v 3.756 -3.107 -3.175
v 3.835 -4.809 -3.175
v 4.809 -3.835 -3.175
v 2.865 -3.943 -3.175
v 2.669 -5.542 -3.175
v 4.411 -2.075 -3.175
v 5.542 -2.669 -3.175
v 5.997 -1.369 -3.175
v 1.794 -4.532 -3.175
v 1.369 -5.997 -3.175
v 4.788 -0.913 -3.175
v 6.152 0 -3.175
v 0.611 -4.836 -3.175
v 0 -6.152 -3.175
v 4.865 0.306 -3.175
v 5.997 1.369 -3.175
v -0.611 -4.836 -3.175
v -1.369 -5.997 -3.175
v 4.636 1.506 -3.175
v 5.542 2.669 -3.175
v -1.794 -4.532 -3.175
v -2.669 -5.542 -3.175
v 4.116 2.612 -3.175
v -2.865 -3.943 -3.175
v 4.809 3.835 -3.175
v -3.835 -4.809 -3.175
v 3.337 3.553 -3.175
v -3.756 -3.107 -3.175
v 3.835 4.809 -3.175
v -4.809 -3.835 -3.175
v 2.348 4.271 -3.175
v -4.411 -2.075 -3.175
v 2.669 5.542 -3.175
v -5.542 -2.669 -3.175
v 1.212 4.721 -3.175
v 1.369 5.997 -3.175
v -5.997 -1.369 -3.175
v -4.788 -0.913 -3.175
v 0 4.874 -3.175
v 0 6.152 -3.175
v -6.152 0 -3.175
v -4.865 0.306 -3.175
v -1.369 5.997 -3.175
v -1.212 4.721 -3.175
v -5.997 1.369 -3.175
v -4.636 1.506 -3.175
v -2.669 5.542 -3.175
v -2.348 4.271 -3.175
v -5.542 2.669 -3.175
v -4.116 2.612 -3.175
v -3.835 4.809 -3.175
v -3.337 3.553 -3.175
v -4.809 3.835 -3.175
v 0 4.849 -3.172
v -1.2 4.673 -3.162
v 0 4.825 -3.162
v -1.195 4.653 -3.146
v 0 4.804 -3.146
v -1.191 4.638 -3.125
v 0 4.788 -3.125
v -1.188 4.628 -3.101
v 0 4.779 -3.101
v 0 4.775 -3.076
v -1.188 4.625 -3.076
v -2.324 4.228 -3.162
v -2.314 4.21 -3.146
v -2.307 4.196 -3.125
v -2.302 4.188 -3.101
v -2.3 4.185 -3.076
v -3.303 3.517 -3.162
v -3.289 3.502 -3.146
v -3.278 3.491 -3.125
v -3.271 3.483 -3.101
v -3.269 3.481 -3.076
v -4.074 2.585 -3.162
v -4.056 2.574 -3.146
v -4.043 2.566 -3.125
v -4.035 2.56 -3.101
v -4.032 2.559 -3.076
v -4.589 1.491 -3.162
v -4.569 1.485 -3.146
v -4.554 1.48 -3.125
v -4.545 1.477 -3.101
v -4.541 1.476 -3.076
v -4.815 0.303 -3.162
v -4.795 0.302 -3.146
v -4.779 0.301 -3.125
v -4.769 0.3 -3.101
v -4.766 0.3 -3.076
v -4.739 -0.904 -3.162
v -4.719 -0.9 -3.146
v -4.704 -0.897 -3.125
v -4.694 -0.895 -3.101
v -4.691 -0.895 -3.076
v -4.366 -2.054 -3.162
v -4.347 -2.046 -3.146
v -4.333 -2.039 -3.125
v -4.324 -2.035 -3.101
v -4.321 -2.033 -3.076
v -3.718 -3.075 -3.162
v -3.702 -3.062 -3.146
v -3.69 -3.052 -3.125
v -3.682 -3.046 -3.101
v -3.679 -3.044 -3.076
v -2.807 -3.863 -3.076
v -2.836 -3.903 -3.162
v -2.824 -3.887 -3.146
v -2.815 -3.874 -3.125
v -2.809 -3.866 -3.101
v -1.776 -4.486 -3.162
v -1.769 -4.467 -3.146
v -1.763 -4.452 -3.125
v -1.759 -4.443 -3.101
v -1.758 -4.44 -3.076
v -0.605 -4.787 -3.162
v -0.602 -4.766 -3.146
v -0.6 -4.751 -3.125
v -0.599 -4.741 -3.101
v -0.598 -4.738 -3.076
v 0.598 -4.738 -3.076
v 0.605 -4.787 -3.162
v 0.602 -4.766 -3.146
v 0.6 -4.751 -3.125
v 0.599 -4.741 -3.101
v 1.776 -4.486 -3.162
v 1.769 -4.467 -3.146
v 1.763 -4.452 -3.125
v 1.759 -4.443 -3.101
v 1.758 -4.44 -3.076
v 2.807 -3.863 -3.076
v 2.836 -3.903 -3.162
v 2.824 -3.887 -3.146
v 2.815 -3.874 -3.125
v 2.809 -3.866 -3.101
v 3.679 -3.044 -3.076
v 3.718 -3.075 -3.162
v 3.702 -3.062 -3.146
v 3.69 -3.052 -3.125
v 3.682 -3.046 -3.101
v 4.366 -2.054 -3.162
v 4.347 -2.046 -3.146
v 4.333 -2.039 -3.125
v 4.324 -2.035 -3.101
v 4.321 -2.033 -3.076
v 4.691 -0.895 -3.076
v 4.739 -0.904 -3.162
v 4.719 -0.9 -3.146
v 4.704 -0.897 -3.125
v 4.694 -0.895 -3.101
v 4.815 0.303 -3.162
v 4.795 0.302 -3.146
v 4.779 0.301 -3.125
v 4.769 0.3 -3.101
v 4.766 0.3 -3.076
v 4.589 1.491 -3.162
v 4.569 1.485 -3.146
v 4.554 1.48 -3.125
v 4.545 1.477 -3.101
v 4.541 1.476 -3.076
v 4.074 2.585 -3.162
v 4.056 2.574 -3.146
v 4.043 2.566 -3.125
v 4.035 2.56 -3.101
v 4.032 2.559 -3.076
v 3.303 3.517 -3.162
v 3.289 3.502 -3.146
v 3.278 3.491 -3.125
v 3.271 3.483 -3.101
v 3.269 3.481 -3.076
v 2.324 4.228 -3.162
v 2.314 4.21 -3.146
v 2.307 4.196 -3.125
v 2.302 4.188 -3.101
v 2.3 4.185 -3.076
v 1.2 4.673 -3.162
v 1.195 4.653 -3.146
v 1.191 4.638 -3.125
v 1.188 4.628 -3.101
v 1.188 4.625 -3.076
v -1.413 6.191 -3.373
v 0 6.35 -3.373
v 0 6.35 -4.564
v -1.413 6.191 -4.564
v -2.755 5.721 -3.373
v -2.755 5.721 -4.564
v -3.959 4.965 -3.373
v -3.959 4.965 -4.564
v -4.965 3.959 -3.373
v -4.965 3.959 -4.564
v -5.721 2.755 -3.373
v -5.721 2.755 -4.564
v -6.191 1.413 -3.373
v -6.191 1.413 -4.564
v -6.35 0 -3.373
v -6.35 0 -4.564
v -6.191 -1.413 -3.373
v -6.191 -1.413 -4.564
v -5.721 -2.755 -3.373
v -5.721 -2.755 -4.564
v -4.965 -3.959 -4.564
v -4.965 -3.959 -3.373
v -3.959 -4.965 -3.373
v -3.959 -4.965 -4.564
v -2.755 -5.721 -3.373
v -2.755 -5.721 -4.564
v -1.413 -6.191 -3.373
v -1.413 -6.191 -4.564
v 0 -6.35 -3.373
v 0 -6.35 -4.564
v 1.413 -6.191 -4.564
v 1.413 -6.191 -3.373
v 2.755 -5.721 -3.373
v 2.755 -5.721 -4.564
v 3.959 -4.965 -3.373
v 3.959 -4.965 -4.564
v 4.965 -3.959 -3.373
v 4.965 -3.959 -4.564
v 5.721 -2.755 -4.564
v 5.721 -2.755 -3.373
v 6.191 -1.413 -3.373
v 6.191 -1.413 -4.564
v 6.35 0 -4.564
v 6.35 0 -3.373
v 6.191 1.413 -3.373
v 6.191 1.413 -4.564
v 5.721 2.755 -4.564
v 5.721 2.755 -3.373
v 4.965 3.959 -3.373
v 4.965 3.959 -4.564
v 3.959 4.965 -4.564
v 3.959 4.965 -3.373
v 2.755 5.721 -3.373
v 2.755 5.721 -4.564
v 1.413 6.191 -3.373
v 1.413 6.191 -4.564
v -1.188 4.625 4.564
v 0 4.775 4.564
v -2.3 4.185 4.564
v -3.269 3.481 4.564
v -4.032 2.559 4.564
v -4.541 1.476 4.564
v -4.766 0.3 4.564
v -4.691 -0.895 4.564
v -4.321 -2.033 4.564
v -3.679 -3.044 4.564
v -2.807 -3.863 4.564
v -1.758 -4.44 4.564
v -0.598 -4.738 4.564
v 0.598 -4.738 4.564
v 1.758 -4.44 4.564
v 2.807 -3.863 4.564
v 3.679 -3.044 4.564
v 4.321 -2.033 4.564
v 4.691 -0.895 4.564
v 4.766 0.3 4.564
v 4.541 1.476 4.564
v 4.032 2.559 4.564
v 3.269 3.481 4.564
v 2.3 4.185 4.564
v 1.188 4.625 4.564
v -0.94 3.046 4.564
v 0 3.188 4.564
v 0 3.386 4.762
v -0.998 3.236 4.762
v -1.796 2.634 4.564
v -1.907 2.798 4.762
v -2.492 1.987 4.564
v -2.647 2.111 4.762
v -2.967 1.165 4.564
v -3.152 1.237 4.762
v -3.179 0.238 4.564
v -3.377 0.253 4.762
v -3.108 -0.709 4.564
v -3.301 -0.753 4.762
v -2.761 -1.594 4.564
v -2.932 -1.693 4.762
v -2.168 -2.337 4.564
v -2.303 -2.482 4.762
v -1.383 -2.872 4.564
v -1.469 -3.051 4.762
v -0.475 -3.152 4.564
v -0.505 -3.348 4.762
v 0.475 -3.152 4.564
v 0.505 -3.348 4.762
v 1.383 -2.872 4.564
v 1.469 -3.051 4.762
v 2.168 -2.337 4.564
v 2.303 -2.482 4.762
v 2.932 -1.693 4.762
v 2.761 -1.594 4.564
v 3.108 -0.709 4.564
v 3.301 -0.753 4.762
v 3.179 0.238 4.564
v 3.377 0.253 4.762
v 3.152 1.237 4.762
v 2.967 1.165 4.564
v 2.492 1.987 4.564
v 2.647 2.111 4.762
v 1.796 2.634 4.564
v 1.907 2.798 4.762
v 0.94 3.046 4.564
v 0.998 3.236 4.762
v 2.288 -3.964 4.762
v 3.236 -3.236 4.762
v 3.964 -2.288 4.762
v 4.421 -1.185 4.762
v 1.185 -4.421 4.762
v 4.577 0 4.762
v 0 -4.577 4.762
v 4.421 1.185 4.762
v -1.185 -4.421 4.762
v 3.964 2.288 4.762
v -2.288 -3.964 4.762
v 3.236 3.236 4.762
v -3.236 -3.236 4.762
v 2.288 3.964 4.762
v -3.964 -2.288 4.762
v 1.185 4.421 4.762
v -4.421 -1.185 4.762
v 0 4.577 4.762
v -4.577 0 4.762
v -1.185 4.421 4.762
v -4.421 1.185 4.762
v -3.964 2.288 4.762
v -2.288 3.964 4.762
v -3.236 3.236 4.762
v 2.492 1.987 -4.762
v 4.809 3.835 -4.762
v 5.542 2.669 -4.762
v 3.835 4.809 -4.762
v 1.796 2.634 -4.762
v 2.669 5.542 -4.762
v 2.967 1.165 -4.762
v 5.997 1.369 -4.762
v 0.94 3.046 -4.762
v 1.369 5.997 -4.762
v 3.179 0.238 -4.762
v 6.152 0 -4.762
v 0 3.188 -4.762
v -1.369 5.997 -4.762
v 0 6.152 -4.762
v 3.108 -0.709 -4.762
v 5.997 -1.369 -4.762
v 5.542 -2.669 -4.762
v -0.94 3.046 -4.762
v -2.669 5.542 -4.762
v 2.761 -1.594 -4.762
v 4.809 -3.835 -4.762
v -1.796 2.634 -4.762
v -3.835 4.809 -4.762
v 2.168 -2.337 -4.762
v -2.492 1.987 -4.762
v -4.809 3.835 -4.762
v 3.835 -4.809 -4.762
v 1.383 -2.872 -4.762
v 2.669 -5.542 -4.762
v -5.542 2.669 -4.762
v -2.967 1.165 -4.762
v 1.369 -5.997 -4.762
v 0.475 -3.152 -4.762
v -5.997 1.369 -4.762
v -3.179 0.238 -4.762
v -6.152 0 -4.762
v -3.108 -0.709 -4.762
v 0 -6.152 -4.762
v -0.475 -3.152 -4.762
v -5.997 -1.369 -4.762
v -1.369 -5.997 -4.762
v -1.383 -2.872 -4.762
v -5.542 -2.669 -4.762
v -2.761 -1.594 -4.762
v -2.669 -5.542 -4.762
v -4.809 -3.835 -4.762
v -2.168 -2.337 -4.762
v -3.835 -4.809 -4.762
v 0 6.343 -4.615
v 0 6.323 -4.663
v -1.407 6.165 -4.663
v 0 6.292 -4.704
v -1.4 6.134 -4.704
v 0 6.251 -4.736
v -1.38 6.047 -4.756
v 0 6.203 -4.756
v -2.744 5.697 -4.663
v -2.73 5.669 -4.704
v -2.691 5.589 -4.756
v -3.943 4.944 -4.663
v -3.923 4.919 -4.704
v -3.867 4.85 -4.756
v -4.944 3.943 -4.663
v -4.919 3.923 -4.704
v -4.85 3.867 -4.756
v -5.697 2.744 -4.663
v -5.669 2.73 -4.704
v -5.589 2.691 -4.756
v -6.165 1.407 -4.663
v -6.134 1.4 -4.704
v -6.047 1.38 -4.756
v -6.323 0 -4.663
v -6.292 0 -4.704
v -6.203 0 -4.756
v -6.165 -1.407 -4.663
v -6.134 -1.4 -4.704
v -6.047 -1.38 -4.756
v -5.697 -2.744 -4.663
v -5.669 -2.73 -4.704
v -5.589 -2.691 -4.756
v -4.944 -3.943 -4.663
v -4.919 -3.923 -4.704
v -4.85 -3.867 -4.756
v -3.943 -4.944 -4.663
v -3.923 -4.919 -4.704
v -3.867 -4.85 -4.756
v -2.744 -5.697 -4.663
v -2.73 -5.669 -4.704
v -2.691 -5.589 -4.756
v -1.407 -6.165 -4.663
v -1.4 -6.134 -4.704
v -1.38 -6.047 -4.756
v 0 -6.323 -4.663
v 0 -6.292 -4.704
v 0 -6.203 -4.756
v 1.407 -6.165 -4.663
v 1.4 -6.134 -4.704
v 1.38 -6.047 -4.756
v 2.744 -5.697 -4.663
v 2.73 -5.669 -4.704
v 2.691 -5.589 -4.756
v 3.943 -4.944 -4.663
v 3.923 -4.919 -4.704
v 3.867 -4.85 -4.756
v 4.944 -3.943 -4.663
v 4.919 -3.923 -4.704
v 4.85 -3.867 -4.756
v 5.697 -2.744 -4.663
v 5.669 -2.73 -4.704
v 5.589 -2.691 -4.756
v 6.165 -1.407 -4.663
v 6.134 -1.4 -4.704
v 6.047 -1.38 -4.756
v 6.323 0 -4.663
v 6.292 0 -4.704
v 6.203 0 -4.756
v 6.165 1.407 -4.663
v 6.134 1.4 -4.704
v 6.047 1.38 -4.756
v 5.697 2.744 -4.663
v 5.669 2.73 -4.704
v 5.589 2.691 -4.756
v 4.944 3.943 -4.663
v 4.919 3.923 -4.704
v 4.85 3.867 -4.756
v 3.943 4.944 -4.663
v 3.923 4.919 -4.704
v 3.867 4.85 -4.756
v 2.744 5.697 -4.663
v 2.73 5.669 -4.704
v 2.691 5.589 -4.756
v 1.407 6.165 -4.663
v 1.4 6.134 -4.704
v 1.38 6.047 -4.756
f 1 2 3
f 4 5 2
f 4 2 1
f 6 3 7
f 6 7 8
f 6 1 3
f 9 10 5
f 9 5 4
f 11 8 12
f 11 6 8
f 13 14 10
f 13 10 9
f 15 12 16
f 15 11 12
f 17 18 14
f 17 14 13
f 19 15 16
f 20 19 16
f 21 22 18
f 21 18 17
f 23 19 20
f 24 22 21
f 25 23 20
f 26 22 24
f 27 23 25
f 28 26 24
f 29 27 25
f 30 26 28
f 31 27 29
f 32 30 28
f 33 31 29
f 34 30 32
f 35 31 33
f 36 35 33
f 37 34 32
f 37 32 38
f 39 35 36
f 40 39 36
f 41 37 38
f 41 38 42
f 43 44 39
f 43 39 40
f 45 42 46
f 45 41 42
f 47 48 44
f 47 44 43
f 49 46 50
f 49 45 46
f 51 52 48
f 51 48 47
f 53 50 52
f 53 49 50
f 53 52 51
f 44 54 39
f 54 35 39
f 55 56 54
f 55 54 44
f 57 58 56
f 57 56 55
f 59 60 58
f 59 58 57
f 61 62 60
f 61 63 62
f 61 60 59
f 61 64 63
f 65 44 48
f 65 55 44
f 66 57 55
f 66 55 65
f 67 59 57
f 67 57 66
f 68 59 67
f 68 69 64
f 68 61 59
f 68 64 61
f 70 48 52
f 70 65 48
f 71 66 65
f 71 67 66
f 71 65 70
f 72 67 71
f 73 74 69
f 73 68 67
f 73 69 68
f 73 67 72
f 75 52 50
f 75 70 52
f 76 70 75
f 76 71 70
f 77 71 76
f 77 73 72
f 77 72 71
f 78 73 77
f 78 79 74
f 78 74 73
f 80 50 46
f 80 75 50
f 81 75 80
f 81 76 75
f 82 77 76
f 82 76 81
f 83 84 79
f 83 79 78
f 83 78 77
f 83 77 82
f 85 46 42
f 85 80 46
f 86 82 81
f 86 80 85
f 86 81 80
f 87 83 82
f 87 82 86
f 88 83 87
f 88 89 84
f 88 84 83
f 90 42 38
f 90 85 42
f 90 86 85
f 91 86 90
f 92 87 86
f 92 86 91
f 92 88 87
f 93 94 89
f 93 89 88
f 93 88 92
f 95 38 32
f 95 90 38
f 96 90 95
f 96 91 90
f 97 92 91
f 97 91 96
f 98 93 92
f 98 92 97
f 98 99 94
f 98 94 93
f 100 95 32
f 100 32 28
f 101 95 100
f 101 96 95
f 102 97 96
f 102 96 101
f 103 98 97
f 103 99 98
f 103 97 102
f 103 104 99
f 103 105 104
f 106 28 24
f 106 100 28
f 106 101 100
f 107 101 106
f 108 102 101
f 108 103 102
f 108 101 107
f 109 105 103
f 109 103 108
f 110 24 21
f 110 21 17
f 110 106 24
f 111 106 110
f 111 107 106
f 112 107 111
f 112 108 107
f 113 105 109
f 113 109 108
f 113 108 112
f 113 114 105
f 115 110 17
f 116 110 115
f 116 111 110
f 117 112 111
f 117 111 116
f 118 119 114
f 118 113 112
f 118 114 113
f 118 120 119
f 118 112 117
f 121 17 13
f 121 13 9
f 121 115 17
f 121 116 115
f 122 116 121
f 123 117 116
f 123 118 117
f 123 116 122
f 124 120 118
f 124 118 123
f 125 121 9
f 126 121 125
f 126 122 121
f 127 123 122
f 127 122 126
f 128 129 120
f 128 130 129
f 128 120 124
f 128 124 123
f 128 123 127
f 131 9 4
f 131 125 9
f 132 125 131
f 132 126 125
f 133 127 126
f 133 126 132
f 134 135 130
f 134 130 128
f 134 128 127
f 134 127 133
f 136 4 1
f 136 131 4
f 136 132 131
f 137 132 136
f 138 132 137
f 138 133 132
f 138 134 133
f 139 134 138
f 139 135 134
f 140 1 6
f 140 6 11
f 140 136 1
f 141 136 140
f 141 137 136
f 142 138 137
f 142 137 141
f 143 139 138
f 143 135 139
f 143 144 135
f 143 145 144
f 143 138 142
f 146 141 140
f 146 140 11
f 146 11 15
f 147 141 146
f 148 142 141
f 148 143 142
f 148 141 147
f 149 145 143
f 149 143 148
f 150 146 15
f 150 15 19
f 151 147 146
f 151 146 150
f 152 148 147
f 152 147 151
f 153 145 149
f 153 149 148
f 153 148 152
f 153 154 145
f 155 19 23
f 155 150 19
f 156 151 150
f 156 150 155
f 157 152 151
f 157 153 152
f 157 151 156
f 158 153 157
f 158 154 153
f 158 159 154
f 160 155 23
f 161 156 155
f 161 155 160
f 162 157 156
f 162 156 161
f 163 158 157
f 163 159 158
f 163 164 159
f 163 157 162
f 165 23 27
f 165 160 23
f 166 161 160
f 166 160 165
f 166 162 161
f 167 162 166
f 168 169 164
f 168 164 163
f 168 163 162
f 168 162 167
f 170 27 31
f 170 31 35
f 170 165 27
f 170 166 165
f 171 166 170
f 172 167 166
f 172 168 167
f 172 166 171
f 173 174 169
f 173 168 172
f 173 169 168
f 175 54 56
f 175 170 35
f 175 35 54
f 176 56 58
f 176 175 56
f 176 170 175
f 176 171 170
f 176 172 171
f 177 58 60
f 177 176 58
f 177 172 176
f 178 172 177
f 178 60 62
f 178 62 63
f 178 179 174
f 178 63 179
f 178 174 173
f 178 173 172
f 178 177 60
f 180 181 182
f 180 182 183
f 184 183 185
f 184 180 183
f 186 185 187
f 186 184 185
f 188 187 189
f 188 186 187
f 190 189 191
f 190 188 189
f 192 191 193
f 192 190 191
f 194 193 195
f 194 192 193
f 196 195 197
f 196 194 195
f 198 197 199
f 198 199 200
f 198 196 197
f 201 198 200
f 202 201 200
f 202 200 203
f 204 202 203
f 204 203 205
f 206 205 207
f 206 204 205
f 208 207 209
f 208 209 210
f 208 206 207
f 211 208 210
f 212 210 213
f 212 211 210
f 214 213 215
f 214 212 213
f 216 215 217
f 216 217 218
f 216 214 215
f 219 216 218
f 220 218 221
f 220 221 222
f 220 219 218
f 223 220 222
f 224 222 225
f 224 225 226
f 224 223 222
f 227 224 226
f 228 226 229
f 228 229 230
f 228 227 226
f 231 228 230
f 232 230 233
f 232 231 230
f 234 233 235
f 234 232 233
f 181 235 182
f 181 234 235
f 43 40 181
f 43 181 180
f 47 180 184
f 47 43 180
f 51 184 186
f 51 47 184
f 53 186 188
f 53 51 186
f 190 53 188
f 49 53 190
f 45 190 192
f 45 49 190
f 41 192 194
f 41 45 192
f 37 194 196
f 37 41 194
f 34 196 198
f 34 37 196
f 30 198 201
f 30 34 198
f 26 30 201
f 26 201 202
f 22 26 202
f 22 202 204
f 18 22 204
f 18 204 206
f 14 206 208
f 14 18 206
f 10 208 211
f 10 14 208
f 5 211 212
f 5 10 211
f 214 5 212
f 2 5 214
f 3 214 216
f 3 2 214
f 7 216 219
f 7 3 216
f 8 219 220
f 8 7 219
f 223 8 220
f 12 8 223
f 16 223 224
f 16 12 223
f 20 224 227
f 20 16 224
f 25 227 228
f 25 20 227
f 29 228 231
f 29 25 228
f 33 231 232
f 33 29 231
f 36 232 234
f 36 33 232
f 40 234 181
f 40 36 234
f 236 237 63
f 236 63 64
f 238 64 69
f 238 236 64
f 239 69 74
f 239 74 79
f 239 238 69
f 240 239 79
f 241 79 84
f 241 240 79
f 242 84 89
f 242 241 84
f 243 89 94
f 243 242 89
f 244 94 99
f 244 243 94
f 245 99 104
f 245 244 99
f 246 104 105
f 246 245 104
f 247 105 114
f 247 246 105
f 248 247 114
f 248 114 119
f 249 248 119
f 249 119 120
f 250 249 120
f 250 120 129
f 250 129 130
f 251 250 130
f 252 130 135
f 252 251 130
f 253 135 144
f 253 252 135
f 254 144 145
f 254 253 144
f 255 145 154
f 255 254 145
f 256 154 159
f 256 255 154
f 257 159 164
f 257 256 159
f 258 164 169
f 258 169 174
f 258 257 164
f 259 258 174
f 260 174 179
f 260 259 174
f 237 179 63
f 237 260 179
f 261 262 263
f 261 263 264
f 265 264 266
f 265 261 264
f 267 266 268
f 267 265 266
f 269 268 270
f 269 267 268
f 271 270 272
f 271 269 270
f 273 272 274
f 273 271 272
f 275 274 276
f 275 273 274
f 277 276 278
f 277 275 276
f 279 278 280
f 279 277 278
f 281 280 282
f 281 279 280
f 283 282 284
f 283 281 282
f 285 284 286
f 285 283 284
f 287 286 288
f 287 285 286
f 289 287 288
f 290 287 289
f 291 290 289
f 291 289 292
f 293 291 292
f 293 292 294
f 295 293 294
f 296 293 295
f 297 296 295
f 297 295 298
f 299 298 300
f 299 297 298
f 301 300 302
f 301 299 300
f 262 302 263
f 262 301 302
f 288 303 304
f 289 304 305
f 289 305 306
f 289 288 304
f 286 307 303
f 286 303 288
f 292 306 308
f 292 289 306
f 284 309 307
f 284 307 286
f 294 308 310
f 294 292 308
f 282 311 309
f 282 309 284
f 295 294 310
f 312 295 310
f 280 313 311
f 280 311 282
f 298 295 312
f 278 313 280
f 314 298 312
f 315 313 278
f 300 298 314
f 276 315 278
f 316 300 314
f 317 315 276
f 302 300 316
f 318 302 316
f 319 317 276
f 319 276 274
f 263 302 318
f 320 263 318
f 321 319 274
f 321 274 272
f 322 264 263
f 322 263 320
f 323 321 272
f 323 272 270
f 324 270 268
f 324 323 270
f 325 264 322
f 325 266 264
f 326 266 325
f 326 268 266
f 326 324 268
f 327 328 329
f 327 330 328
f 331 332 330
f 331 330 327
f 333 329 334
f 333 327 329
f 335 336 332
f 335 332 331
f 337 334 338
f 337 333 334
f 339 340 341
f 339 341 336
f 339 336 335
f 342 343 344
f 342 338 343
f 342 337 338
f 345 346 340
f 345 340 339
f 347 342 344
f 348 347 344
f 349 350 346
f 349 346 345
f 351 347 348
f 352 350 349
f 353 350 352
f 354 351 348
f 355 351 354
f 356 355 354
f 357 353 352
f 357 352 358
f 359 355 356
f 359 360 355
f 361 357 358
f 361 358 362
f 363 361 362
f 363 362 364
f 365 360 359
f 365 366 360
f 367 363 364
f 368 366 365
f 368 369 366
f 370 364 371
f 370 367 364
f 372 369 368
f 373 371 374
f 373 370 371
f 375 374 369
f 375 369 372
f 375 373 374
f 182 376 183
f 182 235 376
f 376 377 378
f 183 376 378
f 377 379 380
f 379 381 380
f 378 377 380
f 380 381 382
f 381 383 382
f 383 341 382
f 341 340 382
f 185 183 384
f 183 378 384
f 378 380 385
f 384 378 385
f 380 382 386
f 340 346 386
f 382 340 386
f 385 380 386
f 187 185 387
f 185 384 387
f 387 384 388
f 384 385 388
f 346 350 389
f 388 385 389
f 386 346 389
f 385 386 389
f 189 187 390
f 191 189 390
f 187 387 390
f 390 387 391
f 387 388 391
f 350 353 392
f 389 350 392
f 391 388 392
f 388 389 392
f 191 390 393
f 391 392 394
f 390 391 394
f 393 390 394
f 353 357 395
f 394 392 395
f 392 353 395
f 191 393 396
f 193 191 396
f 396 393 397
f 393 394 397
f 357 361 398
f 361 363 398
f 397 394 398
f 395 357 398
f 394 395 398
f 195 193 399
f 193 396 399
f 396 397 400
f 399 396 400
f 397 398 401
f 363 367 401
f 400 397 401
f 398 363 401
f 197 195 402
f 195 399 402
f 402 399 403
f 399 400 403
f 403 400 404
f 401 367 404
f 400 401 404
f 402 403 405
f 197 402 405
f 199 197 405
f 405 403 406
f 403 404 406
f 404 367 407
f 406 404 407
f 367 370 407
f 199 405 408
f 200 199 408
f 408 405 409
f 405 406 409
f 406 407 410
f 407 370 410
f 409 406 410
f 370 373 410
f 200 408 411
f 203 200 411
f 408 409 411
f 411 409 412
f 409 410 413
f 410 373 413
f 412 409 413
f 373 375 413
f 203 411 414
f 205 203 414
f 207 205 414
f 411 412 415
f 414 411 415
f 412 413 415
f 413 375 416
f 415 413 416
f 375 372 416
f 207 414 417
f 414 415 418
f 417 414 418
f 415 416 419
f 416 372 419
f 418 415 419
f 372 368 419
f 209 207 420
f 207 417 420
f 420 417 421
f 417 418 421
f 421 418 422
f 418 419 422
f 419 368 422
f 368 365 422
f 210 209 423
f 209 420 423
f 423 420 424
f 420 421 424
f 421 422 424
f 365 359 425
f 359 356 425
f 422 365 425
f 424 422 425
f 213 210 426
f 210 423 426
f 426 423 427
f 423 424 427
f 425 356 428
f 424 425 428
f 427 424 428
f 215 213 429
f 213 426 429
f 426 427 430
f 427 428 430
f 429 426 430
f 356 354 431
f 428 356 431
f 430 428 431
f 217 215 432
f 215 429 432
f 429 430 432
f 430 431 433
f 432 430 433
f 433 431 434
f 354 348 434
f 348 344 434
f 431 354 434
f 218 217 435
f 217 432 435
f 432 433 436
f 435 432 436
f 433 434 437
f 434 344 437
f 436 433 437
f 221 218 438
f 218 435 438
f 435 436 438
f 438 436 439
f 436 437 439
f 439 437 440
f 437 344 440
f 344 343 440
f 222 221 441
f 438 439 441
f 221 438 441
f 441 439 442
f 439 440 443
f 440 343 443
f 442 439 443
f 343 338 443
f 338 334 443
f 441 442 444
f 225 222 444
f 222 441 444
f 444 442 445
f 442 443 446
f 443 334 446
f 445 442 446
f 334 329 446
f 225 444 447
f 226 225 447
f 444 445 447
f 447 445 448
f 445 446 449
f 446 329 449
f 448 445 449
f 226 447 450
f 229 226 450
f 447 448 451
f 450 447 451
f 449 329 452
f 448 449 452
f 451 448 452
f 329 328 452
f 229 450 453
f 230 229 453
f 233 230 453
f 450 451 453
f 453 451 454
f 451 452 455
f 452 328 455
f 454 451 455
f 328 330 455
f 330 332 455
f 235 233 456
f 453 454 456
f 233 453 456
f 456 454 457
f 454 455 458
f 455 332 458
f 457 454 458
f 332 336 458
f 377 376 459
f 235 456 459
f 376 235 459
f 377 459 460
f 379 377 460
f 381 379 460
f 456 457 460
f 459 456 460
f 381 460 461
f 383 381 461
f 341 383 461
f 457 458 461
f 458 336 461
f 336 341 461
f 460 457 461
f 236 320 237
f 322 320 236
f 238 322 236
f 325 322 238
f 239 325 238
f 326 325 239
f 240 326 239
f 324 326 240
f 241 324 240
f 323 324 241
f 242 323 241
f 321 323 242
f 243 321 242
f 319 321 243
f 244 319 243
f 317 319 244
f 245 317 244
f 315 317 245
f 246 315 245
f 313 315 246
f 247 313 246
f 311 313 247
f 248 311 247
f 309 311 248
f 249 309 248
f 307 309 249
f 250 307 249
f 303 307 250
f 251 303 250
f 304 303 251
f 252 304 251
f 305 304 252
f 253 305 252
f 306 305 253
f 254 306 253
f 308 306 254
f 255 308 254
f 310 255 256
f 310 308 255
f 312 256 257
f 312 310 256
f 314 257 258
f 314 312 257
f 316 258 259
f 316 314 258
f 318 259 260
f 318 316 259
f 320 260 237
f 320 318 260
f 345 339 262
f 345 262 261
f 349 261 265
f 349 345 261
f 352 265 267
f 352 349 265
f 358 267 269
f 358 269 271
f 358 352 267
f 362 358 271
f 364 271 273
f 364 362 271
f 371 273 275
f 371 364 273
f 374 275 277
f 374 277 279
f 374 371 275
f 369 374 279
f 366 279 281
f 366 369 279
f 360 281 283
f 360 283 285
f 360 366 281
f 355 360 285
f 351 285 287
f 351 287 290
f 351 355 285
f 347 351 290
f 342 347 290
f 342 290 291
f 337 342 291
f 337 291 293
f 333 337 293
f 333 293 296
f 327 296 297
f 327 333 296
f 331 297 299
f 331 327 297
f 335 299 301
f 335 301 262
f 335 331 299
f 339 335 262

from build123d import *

# Parameters (mm, degrees)
CHAMFER1_SIZE = 0.1984375
FILLET1_R     = 0.1984375
FILLET2_R     = 0.09921875


with BuildPart() as part:
    # Sketch3 → Revolve1 (revolve)
    with BuildSketch(Plane(origin=(0, 0, 0), x_dir=(0, 0, -1), z_dir=(1, 0, 0))):
        Polygon((4.7625, 6.35), (3.175, 6.35), (3.175, 4.7752), (-4.7625, 4.7752), (-4.7625, 3.1877), (4.7625, 3.1877), align=None)
    revolve(axis=Axis((0, 0, -4.7625), (0, 0, 1)))

    # Chamfer1
    chamfer1_edges = [part.edges().sort_by_distance(p)[0] for p in [
        (0, -3.1877, 4.7625),
        (0, -4.7752, 4.7625),
        (0, -6.35, -3.175),
    ]]
    chamfer(chamfer1_edges, length=CHAMFER1_SIZE)

    # Fillet1
    fillet1_edges = [part.edges().sort_by_distance(p)[0] for p in [
        (0, -6.35, -4.7625),
    ]]
    fillet(fillet1_edges, radius=FILLET1_R)

    # Fillet2
    fillet2_edges = [part.edges().sort_by_distance(p)[0] for p in [
        (0, -4.7752, -3.175),
    ]]
    fillet(fillet2_edges, radius=FILLET2_R)


solid = part.part
